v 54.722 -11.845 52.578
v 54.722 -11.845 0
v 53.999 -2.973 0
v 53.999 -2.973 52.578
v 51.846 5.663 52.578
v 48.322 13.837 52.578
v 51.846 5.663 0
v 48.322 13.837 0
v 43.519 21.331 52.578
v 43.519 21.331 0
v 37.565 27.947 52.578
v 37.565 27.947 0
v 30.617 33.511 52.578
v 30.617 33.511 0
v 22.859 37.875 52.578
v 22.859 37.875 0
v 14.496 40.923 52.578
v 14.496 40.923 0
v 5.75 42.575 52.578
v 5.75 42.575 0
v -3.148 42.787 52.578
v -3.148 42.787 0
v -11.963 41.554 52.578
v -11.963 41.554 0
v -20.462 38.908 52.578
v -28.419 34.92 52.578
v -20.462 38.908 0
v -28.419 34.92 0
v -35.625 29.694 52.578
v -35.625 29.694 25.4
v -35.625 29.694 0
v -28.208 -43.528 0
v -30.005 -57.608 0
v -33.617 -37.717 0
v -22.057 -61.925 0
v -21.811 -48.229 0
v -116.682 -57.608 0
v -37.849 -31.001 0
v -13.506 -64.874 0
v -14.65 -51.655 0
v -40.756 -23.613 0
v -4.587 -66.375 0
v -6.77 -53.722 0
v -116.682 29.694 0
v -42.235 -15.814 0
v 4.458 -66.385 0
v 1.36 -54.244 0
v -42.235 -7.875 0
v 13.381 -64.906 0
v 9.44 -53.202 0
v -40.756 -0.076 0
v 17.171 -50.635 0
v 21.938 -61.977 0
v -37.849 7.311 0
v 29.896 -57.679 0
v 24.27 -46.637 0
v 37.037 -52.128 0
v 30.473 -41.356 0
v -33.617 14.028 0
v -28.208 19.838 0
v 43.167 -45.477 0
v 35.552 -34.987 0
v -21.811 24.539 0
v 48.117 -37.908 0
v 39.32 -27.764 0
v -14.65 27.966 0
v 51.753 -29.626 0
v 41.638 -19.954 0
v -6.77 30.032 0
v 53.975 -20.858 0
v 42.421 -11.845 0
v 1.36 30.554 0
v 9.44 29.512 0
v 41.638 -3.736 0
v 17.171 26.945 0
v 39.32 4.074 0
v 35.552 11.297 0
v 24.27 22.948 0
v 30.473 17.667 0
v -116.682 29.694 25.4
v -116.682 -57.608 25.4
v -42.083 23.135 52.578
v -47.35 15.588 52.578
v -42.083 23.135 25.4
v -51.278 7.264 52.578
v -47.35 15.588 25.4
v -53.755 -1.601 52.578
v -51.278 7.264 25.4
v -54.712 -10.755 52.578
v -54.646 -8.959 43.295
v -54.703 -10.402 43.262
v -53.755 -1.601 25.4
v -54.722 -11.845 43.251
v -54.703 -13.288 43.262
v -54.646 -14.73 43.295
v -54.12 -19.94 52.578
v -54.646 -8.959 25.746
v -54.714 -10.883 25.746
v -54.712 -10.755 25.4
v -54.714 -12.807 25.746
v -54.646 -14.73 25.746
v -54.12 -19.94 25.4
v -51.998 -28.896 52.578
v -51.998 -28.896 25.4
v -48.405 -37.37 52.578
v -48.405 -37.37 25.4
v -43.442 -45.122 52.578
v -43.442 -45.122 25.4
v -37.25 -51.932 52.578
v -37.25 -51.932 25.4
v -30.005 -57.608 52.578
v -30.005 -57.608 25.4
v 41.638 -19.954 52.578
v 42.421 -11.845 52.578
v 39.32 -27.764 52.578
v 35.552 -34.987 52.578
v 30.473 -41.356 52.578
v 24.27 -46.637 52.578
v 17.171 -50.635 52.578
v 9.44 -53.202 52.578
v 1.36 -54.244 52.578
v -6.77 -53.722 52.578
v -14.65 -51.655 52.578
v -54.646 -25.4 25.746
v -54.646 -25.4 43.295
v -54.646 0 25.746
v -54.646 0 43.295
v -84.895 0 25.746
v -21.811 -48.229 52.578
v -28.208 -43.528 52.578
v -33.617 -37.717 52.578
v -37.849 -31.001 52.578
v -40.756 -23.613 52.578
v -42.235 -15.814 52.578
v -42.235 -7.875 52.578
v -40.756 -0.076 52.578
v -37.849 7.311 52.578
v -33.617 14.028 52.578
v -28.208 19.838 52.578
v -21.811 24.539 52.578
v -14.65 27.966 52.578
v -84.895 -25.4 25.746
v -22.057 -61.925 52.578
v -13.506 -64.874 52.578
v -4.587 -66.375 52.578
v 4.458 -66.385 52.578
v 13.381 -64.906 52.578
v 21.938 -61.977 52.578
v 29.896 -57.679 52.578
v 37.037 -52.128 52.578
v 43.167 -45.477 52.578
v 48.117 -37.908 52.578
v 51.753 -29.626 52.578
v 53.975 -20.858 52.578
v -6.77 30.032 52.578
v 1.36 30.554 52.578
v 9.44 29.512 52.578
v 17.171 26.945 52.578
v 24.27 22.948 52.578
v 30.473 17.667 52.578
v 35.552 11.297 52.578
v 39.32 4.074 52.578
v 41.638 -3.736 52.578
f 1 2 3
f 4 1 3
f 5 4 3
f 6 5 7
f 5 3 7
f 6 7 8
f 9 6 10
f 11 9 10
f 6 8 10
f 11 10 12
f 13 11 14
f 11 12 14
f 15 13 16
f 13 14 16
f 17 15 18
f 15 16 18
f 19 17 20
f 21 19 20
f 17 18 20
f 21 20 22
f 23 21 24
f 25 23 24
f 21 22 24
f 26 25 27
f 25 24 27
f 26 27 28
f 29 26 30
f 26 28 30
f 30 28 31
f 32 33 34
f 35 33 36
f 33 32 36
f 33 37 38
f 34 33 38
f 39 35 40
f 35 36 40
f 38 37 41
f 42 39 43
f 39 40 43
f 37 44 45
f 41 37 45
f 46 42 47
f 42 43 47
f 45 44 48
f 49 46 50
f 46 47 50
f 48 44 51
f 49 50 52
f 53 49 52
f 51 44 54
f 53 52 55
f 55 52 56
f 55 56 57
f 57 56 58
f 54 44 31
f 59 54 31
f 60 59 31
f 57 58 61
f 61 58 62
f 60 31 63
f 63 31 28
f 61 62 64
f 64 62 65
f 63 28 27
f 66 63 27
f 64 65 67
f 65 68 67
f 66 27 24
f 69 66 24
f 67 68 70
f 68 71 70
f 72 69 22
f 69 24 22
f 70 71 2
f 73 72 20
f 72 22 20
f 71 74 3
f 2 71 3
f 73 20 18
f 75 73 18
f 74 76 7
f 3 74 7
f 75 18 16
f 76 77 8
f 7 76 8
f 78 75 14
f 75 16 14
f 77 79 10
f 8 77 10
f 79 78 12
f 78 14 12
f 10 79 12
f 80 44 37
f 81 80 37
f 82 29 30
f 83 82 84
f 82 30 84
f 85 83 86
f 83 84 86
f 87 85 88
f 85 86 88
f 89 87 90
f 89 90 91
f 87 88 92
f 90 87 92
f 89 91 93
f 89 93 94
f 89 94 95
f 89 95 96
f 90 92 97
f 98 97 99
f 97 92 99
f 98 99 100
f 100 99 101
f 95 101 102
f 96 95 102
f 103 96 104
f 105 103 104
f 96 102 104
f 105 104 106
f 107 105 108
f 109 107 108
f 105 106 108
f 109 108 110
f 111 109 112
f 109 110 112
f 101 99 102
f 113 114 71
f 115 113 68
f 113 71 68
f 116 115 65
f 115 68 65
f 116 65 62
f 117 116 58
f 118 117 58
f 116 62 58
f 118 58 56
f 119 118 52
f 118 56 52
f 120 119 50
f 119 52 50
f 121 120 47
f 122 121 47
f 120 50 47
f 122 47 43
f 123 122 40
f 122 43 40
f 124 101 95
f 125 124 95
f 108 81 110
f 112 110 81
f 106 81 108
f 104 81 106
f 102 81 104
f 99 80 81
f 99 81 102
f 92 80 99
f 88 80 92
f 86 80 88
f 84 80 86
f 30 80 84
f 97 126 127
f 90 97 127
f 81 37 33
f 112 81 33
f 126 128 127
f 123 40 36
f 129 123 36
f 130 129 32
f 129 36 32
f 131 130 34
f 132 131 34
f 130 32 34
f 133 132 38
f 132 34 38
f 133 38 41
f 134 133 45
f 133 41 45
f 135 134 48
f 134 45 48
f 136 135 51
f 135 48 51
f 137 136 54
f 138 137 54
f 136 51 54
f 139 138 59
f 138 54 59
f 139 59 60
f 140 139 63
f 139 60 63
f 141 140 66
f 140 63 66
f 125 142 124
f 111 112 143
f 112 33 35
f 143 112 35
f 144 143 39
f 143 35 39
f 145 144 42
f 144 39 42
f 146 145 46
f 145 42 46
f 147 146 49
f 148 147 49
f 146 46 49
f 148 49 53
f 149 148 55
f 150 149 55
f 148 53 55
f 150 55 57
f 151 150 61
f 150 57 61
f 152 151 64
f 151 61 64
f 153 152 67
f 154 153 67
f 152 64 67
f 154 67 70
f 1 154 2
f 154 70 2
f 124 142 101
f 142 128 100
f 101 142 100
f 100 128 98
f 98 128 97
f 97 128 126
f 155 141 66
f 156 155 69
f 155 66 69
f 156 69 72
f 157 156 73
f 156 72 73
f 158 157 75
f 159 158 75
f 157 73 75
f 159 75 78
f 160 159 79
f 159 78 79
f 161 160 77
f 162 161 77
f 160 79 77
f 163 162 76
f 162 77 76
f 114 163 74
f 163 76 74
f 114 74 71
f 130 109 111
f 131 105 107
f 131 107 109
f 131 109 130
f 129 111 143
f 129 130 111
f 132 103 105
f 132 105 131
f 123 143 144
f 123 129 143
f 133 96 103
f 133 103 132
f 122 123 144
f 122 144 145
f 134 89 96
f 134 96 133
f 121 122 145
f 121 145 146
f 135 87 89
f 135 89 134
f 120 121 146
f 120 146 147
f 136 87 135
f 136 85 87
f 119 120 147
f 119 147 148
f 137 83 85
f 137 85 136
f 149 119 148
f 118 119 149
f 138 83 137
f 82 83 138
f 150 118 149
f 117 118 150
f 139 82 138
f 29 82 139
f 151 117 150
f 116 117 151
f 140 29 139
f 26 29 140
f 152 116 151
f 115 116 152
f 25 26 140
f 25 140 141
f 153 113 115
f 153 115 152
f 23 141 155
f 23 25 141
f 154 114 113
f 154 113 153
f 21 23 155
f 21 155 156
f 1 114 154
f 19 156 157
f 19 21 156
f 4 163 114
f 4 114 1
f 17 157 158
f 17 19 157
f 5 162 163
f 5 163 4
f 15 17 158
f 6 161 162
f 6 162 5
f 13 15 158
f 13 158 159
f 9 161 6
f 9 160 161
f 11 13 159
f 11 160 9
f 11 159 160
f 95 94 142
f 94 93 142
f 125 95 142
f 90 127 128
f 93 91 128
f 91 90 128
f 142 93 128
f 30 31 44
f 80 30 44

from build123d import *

# Parameters (mm, degrees)
F1_DEPTH = 52.578
F2_DEPTH = 25.4
F4_DEPTH = 25.4


with BuildPart() as f1:
    # F0 (on Top) → F1 (new body)
    with BuildSketch(Plane.XY):
        with BuildLine():
            ThreePointArc((54.722488, -11.844719), (22.859211, 37.874565), (-35.624544, 29.693728))
            Line((-35.624544, 29.693728), (-14.65048, 29.693728))
            Line((-14.65048, 29.693728), (-14.65048, 27.965855))
            ThreePointArc((-14.65048, 27.965855), (24.269676, 22.947539), (42.420731, -11.844719))
            ThreePointArc((42.420731, -11.844719), (24.269676, -46.636977), (-14.65048, -51.655293))
            Line((-14.65048, -51.655293), (-14.65048, -57.608001))
            Line((-14.65048, -57.608001), (-30.004545, -57.608001))
            ThreePointArc((-30.004545, -57.608001), (26.006031, -59.992793), (54.722488, -11.844719))
        make_face()
        with BuildLine():
            Line((-14.65048, 29.693728), (-35.624544, 29.693728))
            ThreePointArc((-35.624544, 29.693728), (-54.609453, -15.360171), (-30.004545, -57.608001))
            Line((-30.004545, -57.608001), (-14.65048, -57.608001))
            Line((-14.65048, -57.608001), (-14.65048, -51.655293))
            ThreePointArc((-14.65048, -51.655293), (-42.420731, -11.844719), (-14.65048, 27.965855))
            Line((-14.65048, 27.965855), (-14.65048, 29.693728))
        make_face()
    extrude(amount=F1_DEPTH)

    # F0 (on Top) → F2 (join)
    with BuildSketch(Plane.XY):
        with BuildLine():
            Line((-35.624544, 29.693728), (-116.681829, 29.693728))
            Line((-116.681829, 29.693728), (-116.681829, -57.608001))
            Line((-116.681829, -57.608001), (-30.004545, -57.608001))
            ThreePointArc((-30.004545, -57.608001), (-54.609453, -15.360171), (-35.624544, 29.693728))
        make_face()
        with BuildLine():
            ThreePointArc((54.722488, -11.844719), (22.859211, 37.874565), (-35.624544, 29.693728))
            Line((-35.624544, 29.693728), (-14.65048, 29.693728))
            Line((-14.65048, 29.693728), (-14.65048, 27.965855))
            ThreePointArc((-14.65048, 27.965855), (24.269676, 22.947539), (42.420731, -11.844719))
            ThreePointArc((42.420731, -11.844719), (24.269676, -46.636977), (-14.65048, -51.655293))
            Line((-14.65048, -51.655293), (-14.65048, -57.608001))
            Line((-14.65048, -57.608001), (-30.004545, -57.608001))
            ThreePointArc((-30.004545, -57.608001), (26.006031, -59.992793), (54.722488, -11.844719))
        make_face()
    extrude(amount=F2_DEPTH)

    # F3 (on Front) → F4 (join)
    with BuildSketch(Plane.XZ):
        Polygon((-54.646369, 25.746364), (-54.646369, 43.295454), (-84.895462, 25.746364), align=None)
    extrude(amount=F4_DEPTH)


solid = f1.part
